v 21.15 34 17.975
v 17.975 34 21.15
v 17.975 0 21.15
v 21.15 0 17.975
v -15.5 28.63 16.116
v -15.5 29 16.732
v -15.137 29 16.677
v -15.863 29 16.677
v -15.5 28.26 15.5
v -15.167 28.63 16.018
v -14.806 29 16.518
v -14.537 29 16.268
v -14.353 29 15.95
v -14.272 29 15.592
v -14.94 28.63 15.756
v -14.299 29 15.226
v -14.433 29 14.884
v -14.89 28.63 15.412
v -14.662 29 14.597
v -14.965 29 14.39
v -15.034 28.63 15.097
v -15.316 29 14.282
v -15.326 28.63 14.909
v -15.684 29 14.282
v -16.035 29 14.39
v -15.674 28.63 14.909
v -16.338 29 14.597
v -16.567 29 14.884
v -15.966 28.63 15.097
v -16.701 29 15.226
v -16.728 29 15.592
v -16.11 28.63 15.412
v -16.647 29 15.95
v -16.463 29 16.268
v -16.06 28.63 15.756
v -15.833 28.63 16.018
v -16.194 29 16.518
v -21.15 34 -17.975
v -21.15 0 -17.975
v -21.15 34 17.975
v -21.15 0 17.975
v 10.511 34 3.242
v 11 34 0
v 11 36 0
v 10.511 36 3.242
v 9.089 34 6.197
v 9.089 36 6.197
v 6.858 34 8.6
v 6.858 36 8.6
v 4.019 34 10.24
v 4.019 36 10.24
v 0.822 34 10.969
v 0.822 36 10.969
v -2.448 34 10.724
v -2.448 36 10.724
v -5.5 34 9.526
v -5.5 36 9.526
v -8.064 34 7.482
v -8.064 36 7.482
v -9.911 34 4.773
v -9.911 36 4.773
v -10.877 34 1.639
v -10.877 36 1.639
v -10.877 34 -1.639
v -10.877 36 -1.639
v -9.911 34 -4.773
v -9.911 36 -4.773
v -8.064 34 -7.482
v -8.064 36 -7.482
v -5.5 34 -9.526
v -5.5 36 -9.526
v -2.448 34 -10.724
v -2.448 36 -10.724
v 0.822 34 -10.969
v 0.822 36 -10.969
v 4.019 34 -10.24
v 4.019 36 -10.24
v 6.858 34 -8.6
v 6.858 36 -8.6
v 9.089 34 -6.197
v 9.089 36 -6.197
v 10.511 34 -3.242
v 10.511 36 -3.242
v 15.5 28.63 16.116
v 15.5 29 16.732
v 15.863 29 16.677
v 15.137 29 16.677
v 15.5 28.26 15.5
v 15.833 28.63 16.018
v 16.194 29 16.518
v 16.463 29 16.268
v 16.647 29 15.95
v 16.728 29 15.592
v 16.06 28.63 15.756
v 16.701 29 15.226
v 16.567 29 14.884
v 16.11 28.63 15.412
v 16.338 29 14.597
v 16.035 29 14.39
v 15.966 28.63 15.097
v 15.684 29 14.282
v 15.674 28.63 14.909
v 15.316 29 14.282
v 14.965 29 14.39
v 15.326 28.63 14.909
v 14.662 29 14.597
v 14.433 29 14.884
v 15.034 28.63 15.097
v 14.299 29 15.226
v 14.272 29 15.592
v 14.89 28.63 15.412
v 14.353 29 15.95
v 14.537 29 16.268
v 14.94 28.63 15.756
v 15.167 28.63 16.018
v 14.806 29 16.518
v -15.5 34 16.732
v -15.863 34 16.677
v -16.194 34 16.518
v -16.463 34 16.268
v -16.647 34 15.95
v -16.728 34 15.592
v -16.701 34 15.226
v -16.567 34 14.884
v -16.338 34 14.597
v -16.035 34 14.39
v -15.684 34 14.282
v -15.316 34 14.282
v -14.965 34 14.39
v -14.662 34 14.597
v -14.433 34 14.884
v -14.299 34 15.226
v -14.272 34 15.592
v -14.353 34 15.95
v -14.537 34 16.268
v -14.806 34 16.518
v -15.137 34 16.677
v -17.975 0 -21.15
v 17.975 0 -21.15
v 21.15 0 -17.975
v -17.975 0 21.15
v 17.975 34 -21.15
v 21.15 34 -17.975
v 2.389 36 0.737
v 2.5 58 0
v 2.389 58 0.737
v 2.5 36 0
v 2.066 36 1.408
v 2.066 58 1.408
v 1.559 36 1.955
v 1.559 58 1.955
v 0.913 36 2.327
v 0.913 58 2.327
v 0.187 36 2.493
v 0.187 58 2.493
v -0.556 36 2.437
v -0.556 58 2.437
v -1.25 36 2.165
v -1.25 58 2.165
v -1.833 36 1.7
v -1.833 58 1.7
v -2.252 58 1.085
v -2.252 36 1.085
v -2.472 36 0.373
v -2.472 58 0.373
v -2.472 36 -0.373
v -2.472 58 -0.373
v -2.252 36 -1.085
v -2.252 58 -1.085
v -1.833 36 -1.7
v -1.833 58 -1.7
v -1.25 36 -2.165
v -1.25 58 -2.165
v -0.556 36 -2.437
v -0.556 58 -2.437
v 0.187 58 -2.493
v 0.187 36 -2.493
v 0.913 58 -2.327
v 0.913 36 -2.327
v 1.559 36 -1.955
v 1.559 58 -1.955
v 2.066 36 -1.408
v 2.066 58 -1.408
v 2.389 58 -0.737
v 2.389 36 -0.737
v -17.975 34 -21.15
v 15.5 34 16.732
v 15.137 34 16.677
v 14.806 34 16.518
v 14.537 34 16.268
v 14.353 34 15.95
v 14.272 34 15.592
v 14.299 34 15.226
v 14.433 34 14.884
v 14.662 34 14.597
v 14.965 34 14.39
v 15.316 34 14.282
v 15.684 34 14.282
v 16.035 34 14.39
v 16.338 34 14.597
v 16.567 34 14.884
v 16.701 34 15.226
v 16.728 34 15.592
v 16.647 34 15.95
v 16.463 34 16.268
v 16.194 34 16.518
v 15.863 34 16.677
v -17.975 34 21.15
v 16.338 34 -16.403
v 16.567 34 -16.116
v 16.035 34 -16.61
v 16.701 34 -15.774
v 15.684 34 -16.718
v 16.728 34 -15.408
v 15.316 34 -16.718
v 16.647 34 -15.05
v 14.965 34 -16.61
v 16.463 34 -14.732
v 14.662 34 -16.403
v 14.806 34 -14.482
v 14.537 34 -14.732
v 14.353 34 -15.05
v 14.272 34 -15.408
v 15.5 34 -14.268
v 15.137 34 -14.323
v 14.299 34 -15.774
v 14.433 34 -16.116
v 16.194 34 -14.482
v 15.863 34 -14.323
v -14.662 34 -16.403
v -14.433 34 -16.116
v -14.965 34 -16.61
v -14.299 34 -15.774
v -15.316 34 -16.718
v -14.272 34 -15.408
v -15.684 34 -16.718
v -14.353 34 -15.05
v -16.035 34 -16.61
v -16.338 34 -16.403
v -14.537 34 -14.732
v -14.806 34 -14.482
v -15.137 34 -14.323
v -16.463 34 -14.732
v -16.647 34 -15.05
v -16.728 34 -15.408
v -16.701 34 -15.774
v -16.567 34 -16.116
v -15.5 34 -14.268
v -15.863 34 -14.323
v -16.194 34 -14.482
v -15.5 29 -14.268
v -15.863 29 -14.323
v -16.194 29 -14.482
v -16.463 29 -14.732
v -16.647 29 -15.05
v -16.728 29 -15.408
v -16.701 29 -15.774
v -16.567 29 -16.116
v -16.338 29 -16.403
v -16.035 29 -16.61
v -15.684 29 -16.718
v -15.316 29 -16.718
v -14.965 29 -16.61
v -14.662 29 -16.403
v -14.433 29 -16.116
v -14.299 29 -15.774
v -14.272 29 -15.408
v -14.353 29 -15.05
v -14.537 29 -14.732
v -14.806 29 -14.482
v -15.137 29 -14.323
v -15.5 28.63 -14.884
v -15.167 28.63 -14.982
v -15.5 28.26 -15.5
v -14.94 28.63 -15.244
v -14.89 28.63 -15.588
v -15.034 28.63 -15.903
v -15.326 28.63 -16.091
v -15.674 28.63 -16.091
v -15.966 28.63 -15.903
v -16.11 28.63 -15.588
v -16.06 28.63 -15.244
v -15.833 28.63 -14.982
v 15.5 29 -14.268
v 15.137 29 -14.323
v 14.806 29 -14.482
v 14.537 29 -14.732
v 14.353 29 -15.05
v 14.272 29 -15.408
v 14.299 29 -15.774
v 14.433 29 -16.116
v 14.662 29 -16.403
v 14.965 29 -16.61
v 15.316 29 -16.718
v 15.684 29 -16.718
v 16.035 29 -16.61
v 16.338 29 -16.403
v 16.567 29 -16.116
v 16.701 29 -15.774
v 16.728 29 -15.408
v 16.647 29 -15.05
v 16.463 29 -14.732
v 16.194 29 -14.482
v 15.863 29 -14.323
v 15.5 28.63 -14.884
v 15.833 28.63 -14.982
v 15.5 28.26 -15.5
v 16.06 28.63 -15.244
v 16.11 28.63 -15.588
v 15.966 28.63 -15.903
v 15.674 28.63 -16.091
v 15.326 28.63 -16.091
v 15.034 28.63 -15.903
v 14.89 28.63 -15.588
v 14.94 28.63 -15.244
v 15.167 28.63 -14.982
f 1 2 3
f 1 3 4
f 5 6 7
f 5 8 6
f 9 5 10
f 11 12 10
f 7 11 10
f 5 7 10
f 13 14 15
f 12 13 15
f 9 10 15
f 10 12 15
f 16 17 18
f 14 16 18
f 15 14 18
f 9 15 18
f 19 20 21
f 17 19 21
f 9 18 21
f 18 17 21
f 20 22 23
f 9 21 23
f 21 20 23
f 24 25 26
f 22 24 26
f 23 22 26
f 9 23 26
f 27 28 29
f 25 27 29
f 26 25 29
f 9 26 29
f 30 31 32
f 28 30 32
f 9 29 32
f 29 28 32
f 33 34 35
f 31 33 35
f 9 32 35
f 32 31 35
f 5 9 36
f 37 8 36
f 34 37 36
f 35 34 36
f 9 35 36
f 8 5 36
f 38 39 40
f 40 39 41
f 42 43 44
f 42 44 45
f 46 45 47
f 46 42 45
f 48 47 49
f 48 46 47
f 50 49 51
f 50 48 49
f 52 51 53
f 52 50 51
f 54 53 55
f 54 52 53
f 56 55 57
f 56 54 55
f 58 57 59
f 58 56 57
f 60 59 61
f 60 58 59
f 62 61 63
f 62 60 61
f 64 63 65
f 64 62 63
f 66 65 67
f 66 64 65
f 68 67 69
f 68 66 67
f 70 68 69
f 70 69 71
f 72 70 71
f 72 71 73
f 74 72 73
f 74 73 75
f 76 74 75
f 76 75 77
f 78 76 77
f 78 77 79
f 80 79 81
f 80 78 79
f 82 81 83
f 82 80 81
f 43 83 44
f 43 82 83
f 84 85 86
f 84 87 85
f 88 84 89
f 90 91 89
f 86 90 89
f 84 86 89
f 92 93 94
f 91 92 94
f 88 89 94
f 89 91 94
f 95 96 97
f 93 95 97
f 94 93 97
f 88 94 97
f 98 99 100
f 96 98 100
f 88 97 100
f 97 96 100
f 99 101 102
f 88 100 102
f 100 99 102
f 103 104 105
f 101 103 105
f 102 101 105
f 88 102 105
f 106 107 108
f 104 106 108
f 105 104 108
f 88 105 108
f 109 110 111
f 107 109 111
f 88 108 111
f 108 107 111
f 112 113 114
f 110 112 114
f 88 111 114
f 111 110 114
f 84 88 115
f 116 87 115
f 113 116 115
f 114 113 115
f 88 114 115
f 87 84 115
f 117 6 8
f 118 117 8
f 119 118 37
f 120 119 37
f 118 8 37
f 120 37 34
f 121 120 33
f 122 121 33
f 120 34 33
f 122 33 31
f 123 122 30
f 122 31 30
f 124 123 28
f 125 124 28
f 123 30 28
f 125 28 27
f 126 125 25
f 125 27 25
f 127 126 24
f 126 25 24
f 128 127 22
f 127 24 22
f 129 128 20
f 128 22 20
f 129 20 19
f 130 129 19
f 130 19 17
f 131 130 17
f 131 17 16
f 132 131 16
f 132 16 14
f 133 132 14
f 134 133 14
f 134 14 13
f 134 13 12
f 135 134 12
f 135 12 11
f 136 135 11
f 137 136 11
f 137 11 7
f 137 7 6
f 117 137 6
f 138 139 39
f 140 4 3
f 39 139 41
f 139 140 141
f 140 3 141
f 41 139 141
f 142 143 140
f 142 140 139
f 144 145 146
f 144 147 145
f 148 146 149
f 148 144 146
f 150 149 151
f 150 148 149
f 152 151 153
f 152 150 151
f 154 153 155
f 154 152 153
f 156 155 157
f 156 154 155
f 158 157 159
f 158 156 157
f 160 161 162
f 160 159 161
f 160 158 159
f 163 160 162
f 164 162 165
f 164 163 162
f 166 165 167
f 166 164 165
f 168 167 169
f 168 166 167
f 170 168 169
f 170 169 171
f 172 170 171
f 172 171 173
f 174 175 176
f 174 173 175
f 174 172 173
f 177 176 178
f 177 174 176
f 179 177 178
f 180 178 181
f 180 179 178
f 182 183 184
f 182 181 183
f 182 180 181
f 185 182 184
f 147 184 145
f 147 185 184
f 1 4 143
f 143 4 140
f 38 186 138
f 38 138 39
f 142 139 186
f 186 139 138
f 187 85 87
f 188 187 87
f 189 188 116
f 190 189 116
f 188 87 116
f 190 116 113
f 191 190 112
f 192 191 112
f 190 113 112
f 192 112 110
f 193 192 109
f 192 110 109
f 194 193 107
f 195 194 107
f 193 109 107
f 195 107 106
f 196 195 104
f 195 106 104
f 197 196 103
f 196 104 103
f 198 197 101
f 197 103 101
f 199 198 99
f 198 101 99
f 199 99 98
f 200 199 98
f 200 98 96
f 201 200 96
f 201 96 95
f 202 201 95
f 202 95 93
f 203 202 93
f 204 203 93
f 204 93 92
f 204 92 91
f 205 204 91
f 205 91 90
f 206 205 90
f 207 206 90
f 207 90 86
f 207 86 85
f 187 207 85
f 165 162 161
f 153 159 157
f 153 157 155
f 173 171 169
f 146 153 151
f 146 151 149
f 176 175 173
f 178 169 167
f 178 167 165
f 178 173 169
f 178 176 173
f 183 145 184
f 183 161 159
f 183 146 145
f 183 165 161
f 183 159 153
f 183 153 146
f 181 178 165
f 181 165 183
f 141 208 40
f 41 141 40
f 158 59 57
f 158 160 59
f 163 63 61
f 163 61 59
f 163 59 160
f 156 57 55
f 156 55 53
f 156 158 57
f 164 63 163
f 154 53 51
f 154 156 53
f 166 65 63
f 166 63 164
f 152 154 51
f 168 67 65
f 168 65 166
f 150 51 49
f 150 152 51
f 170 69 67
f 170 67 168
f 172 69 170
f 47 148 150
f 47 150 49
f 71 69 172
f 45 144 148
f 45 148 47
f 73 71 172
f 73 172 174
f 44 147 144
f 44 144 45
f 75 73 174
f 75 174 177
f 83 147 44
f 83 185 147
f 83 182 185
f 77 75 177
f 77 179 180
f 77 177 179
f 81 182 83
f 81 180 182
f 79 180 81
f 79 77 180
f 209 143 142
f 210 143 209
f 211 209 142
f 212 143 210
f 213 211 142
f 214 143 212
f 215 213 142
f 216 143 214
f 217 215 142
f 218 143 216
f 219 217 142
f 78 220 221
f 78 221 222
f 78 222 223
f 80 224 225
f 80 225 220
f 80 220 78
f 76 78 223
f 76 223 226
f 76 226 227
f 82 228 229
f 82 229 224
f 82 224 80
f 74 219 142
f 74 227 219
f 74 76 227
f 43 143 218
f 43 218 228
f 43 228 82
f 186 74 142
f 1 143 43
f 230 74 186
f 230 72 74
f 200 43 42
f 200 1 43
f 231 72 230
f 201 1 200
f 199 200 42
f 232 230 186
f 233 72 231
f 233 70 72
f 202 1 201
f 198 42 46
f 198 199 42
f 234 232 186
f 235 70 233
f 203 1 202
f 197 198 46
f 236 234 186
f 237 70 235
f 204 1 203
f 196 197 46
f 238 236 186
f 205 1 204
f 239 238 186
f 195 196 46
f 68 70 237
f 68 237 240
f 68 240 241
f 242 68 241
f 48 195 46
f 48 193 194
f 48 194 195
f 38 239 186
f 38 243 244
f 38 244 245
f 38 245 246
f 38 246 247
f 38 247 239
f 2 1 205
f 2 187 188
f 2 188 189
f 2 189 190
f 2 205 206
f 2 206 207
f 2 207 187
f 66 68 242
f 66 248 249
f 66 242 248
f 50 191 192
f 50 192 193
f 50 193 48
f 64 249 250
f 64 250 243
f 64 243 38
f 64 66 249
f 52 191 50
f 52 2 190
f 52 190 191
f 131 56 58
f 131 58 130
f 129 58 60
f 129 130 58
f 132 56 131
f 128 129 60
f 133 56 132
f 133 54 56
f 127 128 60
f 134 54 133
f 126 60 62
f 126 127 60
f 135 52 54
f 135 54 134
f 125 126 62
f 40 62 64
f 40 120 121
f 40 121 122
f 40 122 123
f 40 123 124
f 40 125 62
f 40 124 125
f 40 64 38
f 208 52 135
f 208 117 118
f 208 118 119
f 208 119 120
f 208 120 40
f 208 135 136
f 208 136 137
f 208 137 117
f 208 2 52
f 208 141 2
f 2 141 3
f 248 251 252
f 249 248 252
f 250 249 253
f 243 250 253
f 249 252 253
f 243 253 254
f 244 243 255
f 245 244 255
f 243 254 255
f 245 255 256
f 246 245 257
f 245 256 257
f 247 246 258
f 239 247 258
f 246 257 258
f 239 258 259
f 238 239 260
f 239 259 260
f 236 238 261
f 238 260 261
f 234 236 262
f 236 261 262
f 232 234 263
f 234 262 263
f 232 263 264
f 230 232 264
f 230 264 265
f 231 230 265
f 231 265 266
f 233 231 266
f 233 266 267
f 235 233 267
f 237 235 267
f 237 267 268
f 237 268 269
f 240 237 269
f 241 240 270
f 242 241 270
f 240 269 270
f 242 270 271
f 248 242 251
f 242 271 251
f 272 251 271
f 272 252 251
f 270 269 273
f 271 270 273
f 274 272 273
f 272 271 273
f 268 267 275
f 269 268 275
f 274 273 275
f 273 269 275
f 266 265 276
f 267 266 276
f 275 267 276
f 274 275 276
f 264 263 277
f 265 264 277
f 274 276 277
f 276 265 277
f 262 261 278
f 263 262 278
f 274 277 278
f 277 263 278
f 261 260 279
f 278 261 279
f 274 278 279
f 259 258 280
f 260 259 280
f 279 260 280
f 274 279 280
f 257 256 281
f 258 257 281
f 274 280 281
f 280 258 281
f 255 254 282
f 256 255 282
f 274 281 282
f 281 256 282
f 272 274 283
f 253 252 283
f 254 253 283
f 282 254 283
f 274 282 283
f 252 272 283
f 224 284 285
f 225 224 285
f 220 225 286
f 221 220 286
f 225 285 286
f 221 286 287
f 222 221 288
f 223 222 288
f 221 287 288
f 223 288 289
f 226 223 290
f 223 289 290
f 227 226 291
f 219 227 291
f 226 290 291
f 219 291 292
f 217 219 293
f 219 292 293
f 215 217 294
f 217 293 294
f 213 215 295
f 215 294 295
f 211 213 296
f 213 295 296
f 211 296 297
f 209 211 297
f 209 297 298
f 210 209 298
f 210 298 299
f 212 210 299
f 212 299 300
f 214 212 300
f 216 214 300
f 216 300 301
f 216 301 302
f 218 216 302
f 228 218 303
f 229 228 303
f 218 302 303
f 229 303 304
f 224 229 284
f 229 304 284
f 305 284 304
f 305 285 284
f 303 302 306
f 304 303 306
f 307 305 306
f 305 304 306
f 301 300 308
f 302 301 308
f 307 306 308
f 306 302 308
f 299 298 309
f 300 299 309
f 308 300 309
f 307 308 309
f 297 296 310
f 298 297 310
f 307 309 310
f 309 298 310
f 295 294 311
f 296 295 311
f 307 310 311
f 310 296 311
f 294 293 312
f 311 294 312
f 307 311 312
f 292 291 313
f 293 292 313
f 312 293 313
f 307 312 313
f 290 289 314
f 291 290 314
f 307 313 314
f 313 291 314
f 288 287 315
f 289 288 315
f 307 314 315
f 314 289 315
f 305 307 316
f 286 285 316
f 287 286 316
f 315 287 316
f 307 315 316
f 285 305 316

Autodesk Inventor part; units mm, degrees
ref_plane "YZ Plane" through (0, 0, 0) normal (1, 0, 0) x (0, 1, 0)
ref_plane "XZ Plane" through (0, 0, 0) normal (0, 1, 0) x (-1, 0, 0)
ref_plane "XY Plane" through (0, 0, 0) normal (0, 0, 1) x (1, 0, 0)
sketch "Sketch1" plane through (0, 0, 0) normal (0, 1, 0) x (-1, 0, 0)
  line L0 (-17.975, -21.15) -> (17.975, -21.15)
  line L1 (21.15, -17.975) -> (21.15, 17.975)
  line L2 (17.975, 21.15) -> (-17.975, 21.15)
  line L3 (-21.15, 17.975) -> (-21.15, -17.975)
  line L4 (-21.15, -21.15) -> (21.15, 21.15) construction
  line L5 (21.15, -21.15) -> (-21.15, 21.15) construction
  line L6 (17.975, 21.15) -> (21.15, 17.975)
  line L7 (-17.975, 21.15) -> (-21.15, 17.975)
  line L8 (-21.15, -17.975) -> (-17.975, -21.15)
  line L9 (17.975, -21.15) -> (21.15, -17.975)
  point P0 (0, 0)
  dimension "d0" = 42.3
  dimension "d1" = 42.3
  dimension "d2" = 3.175
  dimension "d3" = 3.175
  dimension "d4" = 3.175
  dimension "d5" = 3.175
  dimension "d6" = 3.175
  dimension "d7" = 3.175
  dimension "d8" = 3.175
  dimension "d9" = 3.175
extrude "Extrusion1" add sketch "Sketch1" along normal blind 34
sketch "Sketch2" plane through (0, 34, 0) normal (0, 1, 0) x (1, 0, 0)
  circle A0 centre (0, 0) radius 11
  dimension "d12" = 22
extrude "Extrusion2" add sketch "Sketch2" along normal blind 2
sketch "Sketch3" plane through (0, 36, 0) normal (0, 1, 0) x (1, 0, 0)
  circle A0 centre (0, 0) radius 2.5
  dimension "d15" = 5
extrude "Extrusion3" add sketch "Sketch3" along normal blind 22
sketch "Sketch4" plane through (0, 34, 0) normal (0, 1, 0) x (1, 0, 0)
  line L0 (89.125, 0) -> (-55.025, 0)
  line L1 (0, 94.2917) -> (0, -108.2417)
  point P0 (0, 0)
  point P1 (15.5, 15.5)
  point P2 (15.5, -15.5)
  point P3 (-15.5, 15.5)
  point P4 (-15.5, -15.5)
  dimension "d18" = 31
  dimension "d19" = 31
hole "Hole1" at (15.5, 34, -15.5) at (15.5, 34, 15.5) at (-15.5, 34, -15.5) at (-15.5, 34, 15.5) direction (0, -1, 0) diameter 2.4638 depth 5 tip angle 118
equation "\"d1\" = d0"
equation "\"d3\" = d2"
equation "\"d4\" = d2"
equation "\"d5\" = d4"
equation "\"d6\" = d2"
equation "\"d7\" = d6"
equation "\"d8\" = d2"
equation "\"d9\" = d8"
properties part number "Stepper_Motor"
